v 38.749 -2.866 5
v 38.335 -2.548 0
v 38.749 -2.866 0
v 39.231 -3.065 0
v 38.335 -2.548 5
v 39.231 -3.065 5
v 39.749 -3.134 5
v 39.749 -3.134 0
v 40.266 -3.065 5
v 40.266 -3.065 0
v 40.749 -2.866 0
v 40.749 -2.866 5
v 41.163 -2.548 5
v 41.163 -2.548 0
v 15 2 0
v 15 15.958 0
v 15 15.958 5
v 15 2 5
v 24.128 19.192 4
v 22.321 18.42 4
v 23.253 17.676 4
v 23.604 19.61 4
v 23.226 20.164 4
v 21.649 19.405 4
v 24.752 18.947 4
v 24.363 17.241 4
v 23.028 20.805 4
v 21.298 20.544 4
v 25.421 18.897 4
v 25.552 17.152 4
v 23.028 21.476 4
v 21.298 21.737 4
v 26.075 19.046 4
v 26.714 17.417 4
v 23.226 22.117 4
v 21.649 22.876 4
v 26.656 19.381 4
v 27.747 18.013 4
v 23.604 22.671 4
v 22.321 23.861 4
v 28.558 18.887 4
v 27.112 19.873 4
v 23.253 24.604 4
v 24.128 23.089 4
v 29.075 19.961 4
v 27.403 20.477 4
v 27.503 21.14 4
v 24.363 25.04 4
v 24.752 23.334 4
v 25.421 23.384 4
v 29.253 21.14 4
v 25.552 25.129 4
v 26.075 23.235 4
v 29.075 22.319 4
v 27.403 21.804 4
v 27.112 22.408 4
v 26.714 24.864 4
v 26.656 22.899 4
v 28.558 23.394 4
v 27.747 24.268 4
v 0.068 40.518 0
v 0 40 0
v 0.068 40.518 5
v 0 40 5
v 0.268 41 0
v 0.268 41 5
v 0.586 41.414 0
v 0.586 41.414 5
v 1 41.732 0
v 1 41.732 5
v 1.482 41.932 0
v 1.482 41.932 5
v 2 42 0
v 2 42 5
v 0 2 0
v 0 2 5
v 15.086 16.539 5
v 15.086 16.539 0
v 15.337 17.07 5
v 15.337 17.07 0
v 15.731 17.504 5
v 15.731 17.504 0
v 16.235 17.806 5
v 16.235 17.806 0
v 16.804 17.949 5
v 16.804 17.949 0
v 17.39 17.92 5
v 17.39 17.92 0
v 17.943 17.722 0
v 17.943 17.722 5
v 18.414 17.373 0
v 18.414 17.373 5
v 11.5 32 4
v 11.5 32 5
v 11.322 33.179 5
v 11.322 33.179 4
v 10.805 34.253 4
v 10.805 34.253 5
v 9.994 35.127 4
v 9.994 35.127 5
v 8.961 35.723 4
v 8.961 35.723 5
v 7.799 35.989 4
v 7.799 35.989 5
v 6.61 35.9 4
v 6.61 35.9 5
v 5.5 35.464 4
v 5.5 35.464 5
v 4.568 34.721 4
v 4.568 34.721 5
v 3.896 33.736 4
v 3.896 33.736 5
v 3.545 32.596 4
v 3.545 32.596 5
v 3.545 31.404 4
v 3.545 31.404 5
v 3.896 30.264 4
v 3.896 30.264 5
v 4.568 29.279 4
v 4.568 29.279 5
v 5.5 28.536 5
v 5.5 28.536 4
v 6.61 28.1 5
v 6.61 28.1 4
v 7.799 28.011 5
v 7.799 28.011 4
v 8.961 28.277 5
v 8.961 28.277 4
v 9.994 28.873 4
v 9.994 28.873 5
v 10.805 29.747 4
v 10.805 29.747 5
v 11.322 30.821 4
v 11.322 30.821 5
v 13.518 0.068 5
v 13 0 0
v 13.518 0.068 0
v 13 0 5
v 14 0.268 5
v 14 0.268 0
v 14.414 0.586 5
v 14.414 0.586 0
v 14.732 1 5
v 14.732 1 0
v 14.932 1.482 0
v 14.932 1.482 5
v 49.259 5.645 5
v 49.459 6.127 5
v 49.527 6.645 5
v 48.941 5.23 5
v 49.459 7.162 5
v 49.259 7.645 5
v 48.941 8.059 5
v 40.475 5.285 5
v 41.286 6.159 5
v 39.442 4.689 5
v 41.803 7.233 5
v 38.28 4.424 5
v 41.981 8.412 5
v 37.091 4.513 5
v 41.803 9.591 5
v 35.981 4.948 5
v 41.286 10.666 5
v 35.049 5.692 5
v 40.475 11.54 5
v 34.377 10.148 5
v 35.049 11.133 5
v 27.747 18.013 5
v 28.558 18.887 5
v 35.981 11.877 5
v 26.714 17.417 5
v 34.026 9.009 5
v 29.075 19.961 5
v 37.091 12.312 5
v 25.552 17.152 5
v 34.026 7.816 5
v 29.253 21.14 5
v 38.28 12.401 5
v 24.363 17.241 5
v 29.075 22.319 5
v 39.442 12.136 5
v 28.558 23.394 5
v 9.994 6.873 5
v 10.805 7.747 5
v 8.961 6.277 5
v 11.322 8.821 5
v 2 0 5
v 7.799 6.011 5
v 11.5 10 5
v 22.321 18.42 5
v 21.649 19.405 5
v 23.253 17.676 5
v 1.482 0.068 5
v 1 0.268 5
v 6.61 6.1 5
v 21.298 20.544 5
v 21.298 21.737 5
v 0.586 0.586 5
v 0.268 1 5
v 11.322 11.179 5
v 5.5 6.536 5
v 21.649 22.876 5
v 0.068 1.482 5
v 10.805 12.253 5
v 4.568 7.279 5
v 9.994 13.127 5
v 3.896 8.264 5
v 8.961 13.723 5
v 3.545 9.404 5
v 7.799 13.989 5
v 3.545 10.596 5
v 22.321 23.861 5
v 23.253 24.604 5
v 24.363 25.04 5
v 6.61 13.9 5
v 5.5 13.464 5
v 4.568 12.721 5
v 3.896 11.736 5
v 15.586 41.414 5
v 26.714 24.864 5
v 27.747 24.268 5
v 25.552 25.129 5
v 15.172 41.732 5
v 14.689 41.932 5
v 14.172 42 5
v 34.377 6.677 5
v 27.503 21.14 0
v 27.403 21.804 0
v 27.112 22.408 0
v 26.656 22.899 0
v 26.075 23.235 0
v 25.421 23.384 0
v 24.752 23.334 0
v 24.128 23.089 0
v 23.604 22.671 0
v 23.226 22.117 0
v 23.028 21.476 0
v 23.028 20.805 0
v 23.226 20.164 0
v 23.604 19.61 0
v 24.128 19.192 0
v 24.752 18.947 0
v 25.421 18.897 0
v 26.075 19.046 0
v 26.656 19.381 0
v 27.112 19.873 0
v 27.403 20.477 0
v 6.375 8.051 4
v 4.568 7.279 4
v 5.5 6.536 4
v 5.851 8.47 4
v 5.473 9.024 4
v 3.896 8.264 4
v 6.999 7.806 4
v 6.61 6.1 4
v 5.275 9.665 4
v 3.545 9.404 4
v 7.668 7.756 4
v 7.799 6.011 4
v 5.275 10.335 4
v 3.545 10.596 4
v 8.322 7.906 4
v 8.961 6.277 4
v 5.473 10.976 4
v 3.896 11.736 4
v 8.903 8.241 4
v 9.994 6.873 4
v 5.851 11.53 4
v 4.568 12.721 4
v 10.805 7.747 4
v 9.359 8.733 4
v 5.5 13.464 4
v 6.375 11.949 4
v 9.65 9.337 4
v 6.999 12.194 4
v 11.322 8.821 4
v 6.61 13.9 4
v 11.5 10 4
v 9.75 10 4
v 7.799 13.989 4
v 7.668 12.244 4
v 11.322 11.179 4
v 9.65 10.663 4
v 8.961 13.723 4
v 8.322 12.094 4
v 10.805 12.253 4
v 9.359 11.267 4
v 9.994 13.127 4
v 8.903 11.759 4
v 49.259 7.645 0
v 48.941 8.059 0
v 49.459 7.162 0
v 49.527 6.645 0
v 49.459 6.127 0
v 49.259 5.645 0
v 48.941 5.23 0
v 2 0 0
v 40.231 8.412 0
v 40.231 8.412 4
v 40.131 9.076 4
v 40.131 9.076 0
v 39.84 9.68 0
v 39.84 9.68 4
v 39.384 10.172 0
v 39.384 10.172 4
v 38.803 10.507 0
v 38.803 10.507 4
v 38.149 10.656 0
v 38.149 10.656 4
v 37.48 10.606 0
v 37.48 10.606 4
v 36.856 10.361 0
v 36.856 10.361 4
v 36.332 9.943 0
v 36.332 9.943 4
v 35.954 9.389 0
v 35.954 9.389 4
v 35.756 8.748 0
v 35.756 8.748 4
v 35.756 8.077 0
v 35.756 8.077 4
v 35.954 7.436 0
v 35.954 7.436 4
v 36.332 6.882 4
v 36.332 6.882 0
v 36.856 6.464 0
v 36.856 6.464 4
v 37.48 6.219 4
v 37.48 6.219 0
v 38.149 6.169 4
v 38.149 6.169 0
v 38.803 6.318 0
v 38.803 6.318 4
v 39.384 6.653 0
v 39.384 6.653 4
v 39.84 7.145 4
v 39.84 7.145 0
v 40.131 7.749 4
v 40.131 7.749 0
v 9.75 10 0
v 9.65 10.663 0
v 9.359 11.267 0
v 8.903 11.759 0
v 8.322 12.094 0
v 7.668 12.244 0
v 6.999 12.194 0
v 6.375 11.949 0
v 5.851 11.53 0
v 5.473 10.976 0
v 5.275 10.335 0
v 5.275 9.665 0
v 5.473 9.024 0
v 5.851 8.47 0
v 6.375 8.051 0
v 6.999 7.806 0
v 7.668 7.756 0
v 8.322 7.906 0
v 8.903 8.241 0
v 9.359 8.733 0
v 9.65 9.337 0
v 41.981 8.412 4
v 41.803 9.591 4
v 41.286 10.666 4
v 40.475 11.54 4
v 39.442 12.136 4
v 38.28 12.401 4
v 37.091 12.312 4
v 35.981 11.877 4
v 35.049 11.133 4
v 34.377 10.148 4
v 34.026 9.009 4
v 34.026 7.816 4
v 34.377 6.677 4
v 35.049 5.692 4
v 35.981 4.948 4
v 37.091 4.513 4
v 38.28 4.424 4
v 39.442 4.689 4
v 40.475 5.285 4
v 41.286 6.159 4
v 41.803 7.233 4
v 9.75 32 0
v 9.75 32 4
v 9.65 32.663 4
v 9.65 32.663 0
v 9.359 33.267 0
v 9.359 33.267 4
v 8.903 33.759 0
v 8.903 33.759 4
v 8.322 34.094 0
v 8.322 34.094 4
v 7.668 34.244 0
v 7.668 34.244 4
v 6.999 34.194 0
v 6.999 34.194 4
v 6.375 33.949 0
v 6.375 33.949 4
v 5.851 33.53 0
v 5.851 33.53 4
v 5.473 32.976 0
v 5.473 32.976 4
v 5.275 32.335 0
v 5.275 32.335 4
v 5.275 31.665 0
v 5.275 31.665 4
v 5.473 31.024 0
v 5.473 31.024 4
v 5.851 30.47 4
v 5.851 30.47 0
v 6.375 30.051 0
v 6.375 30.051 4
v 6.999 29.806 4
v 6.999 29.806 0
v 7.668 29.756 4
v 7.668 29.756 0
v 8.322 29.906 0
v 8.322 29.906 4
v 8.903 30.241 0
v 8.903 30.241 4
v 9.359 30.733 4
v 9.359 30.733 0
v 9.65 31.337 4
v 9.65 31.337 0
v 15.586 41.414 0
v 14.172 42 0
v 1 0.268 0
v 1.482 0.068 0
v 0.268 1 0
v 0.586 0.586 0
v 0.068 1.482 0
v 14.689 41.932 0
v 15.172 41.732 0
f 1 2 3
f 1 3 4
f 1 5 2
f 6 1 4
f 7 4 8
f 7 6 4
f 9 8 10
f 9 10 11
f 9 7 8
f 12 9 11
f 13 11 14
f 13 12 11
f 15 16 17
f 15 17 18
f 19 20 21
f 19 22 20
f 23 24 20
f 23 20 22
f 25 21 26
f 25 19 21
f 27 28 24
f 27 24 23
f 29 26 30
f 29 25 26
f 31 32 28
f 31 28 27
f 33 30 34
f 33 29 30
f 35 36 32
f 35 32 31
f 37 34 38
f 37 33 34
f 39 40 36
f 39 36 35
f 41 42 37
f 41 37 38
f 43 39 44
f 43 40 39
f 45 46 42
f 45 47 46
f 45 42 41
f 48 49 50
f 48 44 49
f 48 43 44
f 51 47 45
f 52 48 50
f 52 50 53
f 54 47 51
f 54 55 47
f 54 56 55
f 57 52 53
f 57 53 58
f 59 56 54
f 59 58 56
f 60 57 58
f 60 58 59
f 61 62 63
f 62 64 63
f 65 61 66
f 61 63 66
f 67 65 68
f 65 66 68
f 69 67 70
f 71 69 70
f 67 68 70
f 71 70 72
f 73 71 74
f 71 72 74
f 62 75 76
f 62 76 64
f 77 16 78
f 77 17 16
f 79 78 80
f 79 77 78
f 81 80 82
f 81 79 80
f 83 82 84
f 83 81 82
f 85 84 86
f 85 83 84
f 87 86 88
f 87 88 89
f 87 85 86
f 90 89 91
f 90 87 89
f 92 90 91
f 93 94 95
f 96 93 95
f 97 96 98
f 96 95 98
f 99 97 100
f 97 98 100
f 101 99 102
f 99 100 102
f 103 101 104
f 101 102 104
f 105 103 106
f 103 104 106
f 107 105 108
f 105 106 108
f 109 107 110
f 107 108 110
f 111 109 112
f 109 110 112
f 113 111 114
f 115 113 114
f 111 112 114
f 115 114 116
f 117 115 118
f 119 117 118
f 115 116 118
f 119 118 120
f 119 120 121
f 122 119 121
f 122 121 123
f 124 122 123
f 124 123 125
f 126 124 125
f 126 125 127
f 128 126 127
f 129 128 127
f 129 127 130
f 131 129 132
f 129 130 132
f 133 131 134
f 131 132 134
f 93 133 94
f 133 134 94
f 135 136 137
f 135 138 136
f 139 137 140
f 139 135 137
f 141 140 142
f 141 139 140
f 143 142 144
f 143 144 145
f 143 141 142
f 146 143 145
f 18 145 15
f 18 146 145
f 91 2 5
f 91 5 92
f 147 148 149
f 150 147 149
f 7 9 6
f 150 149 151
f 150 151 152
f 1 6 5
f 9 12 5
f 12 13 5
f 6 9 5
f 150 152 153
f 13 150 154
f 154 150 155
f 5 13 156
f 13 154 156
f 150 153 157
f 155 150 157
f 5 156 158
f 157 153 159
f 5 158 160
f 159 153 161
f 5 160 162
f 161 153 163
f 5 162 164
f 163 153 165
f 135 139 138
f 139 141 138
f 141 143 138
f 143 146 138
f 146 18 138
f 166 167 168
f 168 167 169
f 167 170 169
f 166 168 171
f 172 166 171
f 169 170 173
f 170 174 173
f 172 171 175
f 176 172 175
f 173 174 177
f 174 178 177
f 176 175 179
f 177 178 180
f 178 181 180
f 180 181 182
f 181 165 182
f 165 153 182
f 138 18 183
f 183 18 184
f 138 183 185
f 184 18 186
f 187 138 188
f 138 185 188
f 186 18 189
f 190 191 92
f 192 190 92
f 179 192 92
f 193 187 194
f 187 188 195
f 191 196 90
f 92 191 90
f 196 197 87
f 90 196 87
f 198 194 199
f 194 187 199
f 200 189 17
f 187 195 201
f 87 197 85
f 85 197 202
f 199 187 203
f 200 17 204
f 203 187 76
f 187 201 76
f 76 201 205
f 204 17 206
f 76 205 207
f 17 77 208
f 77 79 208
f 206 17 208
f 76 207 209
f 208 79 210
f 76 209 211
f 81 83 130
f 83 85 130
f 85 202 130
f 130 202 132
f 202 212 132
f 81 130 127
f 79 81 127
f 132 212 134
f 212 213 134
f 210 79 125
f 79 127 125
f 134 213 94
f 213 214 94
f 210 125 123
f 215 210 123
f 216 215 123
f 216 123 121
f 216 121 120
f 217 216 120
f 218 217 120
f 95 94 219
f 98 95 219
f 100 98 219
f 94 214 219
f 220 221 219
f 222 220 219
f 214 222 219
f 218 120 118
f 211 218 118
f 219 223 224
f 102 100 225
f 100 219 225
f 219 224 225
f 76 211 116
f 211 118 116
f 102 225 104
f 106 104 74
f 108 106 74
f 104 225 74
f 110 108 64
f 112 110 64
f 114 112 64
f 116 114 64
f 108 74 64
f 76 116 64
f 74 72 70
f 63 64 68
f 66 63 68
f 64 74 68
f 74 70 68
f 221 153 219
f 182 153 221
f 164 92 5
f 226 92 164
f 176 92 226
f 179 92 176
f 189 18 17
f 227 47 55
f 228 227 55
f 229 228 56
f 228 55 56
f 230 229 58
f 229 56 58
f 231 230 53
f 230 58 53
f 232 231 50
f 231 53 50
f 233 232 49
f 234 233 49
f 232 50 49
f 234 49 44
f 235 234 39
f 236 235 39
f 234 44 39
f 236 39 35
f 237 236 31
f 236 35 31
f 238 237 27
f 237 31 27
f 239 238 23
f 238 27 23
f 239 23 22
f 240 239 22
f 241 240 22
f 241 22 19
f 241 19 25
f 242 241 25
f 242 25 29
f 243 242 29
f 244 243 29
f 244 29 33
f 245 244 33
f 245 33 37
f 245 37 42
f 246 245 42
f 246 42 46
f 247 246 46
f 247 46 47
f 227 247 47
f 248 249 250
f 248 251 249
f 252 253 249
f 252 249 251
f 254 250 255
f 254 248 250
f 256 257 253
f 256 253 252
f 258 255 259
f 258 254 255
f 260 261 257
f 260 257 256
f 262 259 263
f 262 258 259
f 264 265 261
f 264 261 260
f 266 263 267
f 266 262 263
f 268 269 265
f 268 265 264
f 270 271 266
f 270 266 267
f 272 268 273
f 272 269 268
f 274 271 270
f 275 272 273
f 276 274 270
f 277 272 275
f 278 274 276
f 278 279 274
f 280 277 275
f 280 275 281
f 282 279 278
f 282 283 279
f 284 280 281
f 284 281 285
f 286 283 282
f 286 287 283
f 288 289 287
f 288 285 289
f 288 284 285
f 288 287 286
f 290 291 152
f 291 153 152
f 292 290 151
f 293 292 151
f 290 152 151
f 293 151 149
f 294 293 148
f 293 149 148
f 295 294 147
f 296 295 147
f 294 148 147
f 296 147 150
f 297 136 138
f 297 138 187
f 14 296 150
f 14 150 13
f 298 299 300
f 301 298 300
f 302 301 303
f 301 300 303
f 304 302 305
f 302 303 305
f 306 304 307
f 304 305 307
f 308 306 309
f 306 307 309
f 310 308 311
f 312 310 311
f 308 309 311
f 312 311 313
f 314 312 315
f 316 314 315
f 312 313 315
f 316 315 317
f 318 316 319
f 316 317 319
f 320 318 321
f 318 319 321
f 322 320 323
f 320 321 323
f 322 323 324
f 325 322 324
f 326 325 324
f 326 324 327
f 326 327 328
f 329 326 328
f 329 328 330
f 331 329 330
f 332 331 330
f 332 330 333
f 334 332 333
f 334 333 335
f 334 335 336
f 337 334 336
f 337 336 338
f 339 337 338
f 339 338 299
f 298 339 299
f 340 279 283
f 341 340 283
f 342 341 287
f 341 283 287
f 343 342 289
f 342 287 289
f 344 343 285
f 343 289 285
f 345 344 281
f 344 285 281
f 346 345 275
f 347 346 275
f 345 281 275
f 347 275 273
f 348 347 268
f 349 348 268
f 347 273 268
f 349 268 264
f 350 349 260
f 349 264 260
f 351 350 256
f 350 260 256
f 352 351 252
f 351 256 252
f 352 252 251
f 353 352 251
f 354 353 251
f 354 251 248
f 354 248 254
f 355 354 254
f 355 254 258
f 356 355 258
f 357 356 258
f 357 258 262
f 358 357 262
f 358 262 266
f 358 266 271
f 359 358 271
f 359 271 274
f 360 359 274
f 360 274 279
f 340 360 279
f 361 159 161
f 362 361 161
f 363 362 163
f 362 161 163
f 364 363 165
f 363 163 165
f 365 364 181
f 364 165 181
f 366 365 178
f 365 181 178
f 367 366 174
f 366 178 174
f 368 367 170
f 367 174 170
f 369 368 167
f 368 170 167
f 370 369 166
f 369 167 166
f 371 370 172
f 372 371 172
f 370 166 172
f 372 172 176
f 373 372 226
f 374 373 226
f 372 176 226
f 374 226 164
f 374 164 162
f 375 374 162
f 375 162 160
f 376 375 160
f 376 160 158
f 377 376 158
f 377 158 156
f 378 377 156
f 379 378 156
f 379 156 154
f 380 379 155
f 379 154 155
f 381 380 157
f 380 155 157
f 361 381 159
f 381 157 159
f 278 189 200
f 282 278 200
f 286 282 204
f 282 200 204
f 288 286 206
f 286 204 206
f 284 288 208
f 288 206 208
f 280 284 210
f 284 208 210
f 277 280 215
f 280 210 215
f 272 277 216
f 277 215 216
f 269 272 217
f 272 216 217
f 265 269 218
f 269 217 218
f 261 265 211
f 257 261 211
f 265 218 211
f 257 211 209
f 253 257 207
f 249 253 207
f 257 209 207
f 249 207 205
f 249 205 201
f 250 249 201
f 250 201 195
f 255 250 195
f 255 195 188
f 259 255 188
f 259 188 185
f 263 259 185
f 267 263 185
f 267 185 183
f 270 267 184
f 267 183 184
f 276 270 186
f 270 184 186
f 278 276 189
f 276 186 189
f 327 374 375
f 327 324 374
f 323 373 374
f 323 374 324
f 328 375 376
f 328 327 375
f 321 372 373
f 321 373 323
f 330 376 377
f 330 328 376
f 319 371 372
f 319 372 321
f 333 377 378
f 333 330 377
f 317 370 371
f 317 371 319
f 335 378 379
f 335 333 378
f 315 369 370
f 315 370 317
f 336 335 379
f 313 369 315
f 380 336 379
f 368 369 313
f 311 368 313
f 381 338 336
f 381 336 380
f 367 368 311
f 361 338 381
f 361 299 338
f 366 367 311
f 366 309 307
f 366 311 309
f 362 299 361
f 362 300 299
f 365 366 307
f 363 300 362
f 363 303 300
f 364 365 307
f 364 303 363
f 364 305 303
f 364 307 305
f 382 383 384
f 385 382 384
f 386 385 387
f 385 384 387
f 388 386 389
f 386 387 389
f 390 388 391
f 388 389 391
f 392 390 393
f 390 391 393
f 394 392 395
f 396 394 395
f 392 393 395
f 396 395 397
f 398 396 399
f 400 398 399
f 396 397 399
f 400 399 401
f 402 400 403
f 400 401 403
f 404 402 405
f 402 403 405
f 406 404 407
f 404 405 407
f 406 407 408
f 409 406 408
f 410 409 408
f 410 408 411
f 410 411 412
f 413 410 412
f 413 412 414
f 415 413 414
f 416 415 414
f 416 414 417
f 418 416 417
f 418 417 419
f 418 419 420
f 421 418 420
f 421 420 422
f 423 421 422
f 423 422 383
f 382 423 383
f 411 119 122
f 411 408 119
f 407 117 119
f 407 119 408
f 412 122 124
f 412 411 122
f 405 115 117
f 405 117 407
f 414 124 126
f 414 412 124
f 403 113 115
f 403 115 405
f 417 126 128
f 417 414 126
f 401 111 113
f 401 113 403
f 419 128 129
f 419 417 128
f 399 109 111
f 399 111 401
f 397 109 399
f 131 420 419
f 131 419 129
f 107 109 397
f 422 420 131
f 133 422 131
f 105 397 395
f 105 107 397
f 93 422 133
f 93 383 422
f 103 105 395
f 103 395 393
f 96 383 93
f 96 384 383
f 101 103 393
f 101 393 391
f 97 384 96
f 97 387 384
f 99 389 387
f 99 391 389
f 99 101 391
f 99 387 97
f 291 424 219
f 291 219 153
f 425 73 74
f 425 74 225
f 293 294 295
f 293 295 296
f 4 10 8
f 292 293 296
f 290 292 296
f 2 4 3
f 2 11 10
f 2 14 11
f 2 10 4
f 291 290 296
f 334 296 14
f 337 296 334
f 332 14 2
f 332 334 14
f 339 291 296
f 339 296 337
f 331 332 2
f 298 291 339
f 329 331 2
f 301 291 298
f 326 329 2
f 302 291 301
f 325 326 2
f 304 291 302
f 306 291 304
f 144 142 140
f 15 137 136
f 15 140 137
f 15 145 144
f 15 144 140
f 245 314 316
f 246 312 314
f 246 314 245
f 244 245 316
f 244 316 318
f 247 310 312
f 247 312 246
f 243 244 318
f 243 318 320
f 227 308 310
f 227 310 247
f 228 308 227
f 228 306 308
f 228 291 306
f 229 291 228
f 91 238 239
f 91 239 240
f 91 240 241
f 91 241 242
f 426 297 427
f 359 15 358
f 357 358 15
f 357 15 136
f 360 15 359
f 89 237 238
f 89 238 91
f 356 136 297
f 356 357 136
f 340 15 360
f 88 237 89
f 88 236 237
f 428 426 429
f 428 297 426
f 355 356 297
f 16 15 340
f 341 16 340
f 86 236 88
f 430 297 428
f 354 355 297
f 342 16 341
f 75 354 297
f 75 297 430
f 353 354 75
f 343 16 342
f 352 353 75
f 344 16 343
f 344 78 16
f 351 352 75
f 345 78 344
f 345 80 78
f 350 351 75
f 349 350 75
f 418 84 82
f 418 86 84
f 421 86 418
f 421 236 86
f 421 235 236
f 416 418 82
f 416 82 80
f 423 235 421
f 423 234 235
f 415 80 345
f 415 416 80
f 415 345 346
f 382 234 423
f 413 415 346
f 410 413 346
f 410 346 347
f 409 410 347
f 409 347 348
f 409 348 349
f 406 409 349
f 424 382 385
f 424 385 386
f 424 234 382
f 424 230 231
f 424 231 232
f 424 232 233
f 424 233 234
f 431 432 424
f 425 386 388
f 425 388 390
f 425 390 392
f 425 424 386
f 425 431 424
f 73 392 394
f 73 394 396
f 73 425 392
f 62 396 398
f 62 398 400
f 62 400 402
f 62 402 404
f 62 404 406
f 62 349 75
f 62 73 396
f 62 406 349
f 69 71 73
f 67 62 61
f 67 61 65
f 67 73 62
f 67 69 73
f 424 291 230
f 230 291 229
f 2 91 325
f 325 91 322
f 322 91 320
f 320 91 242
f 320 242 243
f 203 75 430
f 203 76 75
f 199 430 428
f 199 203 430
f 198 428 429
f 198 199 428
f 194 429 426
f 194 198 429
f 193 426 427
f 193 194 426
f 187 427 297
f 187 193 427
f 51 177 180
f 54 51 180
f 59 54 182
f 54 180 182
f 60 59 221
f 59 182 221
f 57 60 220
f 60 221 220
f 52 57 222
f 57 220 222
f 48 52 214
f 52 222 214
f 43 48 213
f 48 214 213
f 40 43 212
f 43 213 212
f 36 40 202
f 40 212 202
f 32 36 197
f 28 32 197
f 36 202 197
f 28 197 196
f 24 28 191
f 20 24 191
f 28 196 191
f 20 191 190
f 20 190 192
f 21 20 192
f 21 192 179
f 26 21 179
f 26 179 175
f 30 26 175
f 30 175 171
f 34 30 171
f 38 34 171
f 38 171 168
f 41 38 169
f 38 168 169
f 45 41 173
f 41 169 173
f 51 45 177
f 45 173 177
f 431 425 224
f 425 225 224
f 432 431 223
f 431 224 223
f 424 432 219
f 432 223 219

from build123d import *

# Parameters (mm, degrees)
BOSS_EXTRUDE1_DEPTH = 5
SKETCH2_R           = 4
CUT_EXTRUDE1_DEPTH  = 1
SKETCH3_R           = 2.25
CUT_EXTRUDE2_DEPTH  = 16
FILLET1_R           = 2


with BuildPart() as part:
    # Sketch1 → Boss-Extrude1 (new body)
    with BuildSketch(Plane.XY):
        Polygon((0, 0), (0, 42), (15, 42), (50.355339059, 6.644660941), (39.748737342, -3.961940777), (15, 20.786796564), (15, 0), align=None)
    extrude(amount=BOSS_EXTRUDE1_DEPTH)

    # Sketch2 → Cut-Extrude1 (cut)
    with BuildSketch(Plane.XY.offset(5)):
        with Locations((7.5, 10)):
            Circle(SKETCH2_R)
        with Locations((7.5, 32)):
            Circle(SKETCH2_R)
        with Locations((37.980970389, 8.412427894)):
            Circle(SKETCH2_R)
        with Locations((25.253048327, 21.140349955)):
            Circle(SKETCH2_R)
    extrude(amount=-CUT_EXTRUDE1_DEPTH, mode=Mode.SUBTRACT)

    # Sketch3 → Cut-Extrude2 (cut)
    with BuildSketch(Plane.XY.offset(4)):
        with Locations((7.5, 32)):
            Circle(SKETCH3_R)
        with Locations((7.5, 10)):
            Circle(SKETCH3_R)
        with Locations((25.253048327, 21.140349955)):
            Circle(SKETCH3_R)
        with Locations((37.980970389, 8.412427894)):
            Circle(SKETCH3_R)
    extrude(amount=-CUT_EXTRUDE2_DEPTH, mode=Mode.SUBTRACT)

    # Fillet1
    fillet1_edges = [part.edges().sort_by_distance(p)[0] for p in [
        (0, 0, 2.5),
        (0, 42, 2.5),
        (15, 42, 2.5),
        (50.355339059, 6.644660941, 2.5),
        (39.748737342, -3.961940777, 2.5),
        (15, 20.786796564, 2.5),
        (15, 0, 2.5),
    ]]
    fillet(fillet1_edges, radius=FILLET1_R)


solid = part.part
